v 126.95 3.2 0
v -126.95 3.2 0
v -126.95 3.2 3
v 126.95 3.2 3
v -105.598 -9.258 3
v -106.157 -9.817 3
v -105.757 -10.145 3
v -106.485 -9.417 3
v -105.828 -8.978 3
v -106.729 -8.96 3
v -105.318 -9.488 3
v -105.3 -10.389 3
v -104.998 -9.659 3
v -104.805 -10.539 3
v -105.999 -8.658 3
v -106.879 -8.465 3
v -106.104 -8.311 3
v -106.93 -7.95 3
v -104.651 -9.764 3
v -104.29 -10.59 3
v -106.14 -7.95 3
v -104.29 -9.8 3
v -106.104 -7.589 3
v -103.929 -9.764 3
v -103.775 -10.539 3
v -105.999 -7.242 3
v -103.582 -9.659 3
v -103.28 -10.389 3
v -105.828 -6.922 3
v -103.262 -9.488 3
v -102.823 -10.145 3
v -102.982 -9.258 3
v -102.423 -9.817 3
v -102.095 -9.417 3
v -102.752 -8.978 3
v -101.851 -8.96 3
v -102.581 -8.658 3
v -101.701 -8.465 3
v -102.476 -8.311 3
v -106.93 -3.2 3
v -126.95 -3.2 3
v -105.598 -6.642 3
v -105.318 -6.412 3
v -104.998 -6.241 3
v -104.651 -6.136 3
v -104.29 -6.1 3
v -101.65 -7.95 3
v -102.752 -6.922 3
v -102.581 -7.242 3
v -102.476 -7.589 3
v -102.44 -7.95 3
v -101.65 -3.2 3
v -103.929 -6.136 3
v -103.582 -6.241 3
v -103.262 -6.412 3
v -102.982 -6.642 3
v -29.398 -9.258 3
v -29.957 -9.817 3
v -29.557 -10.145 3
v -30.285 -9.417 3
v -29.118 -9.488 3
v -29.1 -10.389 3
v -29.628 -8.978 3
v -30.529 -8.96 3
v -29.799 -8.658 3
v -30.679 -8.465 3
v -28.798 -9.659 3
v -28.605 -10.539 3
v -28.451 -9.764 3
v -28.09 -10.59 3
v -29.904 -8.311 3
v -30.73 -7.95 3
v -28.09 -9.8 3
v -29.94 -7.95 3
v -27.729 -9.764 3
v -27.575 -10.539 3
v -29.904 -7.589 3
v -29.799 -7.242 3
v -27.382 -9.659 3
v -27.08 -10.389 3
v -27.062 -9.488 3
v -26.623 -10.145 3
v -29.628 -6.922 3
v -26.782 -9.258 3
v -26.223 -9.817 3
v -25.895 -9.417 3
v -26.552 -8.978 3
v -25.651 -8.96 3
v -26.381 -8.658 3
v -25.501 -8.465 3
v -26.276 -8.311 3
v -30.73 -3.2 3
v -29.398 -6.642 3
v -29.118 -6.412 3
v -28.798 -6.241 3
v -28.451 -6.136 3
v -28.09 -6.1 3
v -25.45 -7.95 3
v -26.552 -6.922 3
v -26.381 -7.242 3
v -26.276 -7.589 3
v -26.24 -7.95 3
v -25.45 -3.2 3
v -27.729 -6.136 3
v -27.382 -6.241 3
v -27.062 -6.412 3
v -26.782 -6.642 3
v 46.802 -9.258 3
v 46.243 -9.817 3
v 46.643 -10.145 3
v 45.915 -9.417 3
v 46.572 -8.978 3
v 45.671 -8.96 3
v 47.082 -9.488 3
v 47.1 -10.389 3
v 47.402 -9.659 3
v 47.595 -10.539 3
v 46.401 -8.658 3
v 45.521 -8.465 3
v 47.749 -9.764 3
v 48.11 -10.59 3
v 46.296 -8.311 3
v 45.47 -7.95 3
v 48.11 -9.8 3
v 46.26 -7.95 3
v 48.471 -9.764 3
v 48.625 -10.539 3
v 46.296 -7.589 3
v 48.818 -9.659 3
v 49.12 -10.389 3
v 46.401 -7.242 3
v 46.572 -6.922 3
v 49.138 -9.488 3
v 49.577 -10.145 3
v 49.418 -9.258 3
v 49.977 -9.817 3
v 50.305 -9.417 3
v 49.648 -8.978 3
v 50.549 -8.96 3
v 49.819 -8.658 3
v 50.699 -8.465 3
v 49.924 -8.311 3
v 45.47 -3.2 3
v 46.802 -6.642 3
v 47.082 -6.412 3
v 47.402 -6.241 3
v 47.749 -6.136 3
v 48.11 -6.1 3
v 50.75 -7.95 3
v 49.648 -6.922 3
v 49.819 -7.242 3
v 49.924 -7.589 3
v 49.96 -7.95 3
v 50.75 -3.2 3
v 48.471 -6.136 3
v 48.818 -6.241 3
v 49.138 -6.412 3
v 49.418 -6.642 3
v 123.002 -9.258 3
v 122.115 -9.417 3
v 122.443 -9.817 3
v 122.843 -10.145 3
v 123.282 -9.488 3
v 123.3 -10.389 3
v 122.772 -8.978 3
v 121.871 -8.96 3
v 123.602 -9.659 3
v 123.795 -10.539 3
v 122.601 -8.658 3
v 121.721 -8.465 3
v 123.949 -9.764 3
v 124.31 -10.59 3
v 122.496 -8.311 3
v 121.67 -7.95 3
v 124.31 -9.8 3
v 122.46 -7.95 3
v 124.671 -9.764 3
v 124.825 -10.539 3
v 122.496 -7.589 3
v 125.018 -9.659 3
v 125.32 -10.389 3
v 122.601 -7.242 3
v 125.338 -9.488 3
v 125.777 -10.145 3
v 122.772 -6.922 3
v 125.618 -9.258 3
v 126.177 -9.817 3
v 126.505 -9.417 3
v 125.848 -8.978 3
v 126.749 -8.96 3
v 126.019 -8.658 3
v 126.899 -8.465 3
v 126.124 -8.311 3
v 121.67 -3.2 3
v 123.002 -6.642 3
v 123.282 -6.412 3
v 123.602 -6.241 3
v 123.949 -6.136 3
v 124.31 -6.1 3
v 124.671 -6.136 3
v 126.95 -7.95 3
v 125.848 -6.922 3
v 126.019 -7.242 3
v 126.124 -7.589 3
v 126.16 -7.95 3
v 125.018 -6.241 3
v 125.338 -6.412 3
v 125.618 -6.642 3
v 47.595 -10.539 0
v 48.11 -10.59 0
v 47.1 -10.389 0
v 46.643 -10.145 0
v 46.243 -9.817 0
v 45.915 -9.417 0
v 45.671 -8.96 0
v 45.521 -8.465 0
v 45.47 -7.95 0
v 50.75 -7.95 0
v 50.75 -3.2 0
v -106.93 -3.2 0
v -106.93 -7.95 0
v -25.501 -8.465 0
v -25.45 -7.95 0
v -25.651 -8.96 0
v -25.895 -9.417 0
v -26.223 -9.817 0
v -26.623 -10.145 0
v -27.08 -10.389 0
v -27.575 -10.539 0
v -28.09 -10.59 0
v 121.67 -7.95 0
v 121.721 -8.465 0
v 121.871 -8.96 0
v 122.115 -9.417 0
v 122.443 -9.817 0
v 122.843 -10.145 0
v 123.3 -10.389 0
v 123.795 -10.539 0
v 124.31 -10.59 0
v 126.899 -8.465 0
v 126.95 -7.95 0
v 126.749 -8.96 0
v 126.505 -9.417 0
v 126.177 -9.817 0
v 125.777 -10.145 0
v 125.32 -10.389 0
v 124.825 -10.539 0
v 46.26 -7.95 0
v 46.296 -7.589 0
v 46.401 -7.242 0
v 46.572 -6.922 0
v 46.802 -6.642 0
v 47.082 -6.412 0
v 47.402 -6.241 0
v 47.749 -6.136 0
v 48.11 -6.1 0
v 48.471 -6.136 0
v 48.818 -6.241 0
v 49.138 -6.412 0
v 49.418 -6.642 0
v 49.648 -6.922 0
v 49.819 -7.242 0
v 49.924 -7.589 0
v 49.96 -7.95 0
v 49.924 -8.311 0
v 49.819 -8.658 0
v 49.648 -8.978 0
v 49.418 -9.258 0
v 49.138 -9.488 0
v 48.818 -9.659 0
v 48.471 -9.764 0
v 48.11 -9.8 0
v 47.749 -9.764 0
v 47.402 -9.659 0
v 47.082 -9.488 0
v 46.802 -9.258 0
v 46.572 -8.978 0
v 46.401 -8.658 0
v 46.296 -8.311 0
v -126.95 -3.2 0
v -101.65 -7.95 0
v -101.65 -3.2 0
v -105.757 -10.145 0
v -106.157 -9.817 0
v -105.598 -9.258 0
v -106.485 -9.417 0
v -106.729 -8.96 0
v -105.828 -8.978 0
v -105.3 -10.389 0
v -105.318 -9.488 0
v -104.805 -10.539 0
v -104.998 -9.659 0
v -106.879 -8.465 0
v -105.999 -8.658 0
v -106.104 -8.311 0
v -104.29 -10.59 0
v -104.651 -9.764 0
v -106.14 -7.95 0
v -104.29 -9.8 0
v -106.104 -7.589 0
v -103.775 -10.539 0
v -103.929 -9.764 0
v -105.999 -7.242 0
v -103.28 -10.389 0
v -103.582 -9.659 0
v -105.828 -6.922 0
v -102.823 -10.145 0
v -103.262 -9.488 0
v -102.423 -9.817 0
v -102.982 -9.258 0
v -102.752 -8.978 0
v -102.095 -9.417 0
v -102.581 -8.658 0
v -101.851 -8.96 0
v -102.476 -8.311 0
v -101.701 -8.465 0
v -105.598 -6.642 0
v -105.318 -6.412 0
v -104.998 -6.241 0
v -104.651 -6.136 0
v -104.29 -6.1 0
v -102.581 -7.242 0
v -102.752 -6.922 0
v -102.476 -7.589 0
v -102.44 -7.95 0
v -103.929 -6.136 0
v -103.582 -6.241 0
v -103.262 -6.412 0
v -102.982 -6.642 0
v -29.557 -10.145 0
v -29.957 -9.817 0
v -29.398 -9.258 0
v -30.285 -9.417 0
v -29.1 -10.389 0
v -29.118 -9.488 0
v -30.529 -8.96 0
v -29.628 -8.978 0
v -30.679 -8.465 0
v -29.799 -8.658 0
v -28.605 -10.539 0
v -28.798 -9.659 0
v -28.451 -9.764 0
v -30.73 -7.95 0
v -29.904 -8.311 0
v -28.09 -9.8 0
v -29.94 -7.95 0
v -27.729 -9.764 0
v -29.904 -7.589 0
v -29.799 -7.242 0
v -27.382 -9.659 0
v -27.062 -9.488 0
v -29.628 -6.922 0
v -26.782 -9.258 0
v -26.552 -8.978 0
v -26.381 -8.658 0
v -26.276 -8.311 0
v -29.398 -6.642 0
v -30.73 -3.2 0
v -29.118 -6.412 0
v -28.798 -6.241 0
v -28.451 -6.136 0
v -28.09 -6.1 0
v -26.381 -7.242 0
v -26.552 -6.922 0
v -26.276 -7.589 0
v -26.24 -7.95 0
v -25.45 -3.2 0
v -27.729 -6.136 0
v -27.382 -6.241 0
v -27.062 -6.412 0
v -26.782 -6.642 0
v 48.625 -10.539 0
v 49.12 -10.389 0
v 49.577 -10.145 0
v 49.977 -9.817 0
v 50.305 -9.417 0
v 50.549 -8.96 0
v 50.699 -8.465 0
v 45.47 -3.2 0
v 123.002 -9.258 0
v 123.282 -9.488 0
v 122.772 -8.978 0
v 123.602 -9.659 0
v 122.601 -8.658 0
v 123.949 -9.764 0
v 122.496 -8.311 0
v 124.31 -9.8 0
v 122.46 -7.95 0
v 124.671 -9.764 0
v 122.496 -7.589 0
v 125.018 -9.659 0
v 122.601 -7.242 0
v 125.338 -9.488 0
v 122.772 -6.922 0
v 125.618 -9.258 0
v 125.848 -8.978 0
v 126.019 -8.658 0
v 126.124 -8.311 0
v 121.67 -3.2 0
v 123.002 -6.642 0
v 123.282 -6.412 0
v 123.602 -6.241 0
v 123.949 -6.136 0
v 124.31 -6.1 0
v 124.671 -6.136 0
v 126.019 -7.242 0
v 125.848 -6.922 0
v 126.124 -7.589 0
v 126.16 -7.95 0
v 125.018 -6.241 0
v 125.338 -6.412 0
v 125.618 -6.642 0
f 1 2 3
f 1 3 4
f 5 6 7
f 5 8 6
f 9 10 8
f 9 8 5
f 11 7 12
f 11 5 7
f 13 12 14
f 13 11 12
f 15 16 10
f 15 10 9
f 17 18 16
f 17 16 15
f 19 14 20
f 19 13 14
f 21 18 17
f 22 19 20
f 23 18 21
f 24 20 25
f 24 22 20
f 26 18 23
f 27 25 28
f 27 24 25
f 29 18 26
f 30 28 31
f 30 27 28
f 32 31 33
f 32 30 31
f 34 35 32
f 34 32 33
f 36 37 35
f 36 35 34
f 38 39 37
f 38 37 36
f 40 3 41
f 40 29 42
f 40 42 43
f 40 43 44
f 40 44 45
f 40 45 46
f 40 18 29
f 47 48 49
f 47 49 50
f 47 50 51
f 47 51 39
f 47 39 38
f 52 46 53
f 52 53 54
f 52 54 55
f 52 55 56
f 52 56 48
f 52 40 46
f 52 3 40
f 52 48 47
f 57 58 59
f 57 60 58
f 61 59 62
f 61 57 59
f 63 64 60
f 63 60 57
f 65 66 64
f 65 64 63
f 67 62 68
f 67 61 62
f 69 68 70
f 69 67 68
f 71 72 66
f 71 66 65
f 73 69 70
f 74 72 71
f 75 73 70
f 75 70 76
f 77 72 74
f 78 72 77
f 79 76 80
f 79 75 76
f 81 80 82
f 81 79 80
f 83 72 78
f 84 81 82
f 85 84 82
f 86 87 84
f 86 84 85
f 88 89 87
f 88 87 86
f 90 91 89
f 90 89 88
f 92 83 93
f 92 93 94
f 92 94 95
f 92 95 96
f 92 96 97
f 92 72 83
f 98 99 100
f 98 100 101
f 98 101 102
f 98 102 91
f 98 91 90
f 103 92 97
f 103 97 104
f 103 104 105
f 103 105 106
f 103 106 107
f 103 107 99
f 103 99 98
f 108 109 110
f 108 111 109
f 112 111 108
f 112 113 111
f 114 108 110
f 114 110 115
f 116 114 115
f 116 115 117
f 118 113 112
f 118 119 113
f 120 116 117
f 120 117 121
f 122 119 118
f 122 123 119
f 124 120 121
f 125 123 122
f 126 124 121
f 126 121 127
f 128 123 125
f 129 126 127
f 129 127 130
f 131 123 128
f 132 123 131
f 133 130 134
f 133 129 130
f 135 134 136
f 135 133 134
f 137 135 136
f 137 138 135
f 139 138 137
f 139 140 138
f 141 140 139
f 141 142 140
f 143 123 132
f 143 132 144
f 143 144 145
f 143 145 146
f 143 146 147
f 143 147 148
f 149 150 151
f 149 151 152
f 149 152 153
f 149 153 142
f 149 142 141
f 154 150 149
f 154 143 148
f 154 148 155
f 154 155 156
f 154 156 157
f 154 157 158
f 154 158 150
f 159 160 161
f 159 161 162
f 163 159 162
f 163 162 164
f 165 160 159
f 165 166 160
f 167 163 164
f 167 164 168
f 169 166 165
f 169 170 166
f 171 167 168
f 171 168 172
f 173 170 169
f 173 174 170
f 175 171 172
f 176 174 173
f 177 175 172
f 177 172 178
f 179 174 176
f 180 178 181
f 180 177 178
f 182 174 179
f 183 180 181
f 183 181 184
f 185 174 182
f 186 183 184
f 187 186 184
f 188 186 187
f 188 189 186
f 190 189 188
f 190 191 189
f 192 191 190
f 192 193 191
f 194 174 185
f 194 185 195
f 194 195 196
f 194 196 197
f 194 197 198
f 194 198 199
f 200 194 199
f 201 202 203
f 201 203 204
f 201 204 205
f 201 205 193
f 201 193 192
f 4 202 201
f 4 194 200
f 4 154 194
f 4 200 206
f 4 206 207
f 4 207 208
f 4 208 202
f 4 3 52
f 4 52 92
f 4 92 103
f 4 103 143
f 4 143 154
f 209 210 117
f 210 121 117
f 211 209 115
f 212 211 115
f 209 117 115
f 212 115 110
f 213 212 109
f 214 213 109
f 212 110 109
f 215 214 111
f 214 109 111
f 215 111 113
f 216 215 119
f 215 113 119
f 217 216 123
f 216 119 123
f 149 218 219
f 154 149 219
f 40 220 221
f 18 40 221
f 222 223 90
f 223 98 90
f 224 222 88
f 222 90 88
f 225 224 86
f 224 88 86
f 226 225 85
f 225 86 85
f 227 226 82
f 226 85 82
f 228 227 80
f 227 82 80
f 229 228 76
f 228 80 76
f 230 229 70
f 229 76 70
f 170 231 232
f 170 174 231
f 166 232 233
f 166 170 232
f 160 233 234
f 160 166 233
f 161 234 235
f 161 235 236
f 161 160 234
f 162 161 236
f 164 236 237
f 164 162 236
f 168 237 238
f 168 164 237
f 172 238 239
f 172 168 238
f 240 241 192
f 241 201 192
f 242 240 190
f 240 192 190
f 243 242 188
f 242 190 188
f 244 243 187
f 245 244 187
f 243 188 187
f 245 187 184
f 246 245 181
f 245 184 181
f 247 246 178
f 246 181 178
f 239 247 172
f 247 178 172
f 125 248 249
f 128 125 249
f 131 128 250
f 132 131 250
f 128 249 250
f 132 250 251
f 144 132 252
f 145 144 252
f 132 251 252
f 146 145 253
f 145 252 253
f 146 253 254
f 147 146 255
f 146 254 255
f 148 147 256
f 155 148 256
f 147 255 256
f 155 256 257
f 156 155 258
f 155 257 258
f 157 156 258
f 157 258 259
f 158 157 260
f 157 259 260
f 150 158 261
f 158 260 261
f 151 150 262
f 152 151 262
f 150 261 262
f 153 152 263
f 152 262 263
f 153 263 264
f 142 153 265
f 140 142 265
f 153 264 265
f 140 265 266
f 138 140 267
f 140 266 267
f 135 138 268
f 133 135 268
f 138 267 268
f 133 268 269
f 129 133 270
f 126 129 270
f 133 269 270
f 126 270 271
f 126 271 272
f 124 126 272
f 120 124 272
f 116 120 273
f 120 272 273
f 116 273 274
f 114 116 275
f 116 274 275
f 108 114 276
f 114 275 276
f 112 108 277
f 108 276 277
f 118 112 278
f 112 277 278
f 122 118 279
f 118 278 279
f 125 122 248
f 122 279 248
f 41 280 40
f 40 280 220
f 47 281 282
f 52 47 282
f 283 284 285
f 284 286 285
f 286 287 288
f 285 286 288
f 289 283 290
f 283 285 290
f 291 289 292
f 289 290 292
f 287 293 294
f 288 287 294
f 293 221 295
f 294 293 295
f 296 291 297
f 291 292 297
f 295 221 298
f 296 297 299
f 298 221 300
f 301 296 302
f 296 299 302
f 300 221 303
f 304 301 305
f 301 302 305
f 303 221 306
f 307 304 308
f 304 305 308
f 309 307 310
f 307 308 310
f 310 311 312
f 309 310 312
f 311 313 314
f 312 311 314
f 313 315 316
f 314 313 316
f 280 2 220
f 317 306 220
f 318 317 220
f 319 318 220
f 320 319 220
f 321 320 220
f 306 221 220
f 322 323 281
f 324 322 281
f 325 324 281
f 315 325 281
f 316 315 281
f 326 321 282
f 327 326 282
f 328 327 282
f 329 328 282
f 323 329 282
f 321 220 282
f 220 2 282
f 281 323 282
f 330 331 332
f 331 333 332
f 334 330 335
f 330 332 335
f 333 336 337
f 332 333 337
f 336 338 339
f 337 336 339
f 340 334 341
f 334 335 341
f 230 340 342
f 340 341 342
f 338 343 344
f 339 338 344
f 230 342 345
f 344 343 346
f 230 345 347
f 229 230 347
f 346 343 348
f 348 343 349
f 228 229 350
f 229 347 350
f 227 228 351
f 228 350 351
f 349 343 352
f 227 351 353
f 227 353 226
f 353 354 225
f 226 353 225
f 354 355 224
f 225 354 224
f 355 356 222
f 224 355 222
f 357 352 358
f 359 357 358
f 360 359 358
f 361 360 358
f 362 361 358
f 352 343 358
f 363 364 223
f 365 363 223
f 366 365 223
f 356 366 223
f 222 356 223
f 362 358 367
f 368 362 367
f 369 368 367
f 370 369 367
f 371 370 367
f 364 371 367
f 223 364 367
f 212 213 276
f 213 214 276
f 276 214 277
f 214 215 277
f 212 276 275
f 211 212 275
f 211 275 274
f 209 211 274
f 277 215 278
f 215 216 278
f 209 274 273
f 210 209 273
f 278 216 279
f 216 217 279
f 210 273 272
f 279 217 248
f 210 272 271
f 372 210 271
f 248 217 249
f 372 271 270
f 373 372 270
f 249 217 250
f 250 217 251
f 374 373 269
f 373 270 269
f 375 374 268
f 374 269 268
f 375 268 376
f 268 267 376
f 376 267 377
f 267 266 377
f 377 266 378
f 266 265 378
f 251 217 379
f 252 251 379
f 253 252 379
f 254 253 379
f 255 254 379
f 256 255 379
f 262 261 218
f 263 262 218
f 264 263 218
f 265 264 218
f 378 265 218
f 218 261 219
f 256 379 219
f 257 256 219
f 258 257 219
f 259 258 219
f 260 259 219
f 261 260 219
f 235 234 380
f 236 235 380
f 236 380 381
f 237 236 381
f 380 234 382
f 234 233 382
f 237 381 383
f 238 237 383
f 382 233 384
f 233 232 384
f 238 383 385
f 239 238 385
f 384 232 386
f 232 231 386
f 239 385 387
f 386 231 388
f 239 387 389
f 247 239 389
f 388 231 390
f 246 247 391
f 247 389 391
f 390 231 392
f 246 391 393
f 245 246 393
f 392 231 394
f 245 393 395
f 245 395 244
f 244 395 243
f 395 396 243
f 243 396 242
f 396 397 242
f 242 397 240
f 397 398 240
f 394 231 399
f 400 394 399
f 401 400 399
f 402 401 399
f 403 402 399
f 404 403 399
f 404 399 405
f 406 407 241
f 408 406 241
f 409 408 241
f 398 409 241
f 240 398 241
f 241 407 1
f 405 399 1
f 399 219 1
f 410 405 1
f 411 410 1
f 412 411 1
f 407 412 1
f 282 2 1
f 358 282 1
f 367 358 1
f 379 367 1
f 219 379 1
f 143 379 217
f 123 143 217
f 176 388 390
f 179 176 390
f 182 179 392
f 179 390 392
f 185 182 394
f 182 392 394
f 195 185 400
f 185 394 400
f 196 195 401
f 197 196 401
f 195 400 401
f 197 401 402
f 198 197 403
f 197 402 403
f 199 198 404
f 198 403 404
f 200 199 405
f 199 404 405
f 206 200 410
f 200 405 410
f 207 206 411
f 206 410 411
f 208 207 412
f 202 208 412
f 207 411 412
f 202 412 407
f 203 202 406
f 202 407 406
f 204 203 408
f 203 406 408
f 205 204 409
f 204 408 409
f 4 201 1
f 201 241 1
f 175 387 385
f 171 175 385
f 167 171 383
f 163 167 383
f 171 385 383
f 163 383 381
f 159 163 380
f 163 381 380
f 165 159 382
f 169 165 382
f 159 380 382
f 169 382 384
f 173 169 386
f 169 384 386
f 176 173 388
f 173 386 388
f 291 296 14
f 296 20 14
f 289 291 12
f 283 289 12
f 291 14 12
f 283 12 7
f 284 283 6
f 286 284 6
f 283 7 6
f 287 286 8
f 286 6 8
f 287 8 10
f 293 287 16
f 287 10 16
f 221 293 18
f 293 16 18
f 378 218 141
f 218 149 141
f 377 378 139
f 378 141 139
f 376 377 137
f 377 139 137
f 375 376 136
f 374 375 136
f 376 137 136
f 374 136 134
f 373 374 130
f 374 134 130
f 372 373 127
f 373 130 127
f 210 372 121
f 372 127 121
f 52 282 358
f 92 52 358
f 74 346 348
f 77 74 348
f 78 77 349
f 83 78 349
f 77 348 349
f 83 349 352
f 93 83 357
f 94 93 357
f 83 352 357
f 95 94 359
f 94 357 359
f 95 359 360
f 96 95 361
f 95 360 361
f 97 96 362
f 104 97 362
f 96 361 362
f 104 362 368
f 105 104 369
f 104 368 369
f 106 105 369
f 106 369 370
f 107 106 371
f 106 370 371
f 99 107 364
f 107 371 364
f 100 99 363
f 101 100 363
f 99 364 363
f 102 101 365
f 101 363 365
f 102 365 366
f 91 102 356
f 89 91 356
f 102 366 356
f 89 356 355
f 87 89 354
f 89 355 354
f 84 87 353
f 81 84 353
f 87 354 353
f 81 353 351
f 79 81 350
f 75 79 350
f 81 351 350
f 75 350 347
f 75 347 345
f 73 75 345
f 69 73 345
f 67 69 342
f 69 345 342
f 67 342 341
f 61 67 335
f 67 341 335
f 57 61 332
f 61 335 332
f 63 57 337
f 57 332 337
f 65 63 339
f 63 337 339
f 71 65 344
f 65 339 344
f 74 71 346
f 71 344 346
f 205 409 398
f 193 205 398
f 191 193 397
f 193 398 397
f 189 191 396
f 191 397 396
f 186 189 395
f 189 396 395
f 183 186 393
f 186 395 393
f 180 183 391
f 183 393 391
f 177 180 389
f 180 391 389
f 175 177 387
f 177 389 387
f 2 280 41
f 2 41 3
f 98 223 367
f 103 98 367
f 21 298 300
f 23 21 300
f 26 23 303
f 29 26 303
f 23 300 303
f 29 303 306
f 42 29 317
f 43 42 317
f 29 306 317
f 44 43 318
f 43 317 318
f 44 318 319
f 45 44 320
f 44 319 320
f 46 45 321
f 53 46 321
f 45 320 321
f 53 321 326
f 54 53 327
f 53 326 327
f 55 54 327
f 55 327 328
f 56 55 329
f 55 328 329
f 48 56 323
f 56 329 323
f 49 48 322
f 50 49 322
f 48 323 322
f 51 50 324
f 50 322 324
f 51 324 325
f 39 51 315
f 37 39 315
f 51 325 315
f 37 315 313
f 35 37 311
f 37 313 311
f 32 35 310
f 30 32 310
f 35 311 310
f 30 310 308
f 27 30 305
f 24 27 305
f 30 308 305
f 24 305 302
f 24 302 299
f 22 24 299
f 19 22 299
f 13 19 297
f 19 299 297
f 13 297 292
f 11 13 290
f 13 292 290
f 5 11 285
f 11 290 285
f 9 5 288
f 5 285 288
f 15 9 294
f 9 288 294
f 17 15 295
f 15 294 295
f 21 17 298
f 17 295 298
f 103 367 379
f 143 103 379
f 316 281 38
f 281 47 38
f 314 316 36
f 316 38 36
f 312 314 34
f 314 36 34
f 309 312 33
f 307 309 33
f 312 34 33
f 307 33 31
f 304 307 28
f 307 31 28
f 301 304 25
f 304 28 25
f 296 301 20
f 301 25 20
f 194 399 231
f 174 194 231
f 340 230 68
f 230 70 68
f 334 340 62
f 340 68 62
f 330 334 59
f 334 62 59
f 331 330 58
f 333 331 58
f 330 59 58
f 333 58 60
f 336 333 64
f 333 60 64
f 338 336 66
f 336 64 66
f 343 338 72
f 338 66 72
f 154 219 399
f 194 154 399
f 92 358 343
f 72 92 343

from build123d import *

# Parameters (mm, degrees)
F0_W     = 253.9
F0_H     = 6.4
F1_DEPTH = 3
F3_DEPTH = 3
F4_R     = 2.63999


# Not quite as in the source:
# - a fillet or chamfer is up to 0.001 mm smaller than in the source, because OpenCascade refuses the exact size


with BuildPart() as f1:
    # F0 (on Top) → F1 (new body)
    with BuildSketch(Plane.XY):
        Rectangle(F0_W, F0_H)
    extrude(amount=F1_DEPTH)

    # F2 (on Top) → F3 (join)
    with BuildSketch(Plane.XY):
        with BuildLine():
            Line((126.95, -10.59), (126.95, -3.2))
            Line((126.95, -3.2), (121.67, -3.2))
            Line((121.67, -3.2), (121.67, -7.95))
            Line((121.67, -7.95), (122.46, -7.95))
            ThreePointArc((122.46, -7.95), (124.31, -6.1), (126.16, -7.95))
            ThreePointArc((126.16, -7.95), (125.6181475452, -9.2581475452), (124.31, -9.8))
            Line((124.31, -9.8), (124.31, -10.59))
            Line((124.31, -10.59), (126.95, -10.59))
        make_face()
        with BuildLine():
            Line((122.46, -7.95), (121.67, -7.95))
            Line((121.67, -7.95), (121.67, -10.59))
            Line((121.67, -10.59), (124.31, -10.59))
            Line((124.31, -10.59), (124.31, -9.8))
            ThreePointArc((124.31, -9.8), (123.0018524548, -9.2581475452), (122.46, -7.95))
        make_face()
        Polygon((50.75, -10.59), (50.75, -3.2), (45.47, -3.2), (45.47, -7.95), (45.47, -10.59), align=None)
        with BuildLine():
            ThreePointArc((49.96, -7.95), (48.11, -9.8), (46.26, -7.95))
            ThreePointArc((46.26, -7.95), (48.11, -6.1), (49.96, -7.95))
        make_face(mode=Mode.SUBTRACT)
        Polygon((-101.65, -3.2), (-106.93, -3.2), (-106.93, -7.95), (-106.93, -10.59), (-101.65, -10.59), align=None)
        with BuildLine():
            ThreePointArc((-102.44, -7.95), (-104.29, -9.8), (-106.14, -7.95))
            ThreePointArc((-106.14, -7.95), (-104.29, -6.1), (-102.44, -7.95))
        make_face(mode=Mode.SUBTRACT)
        Polygon((-25.45, -3.2), (-30.73, -3.2), (-30.73, -7.95), (-30.73, -10.59), (-25.45, -10.59), align=None)
        with BuildLine():
            ThreePointArc((-26.24, -7.95), (-28.09, -9.8), (-29.94, -7.95))
            ThreePointArc((-29.94, -7.95), (-28.09, -6.1), (-26.24, -7.95))
        make_face(mode=Mode.SUBTRACT)
    extrude(amount=F3_DEPTH)

    # F4 (radius 2.64 in the source; OpenCascade refuses exactly that, so slightly less here)
    f4_edges = [f1.edges().sort_by_distance(p)[0] for p in [
        (45.47, -10.59, 1.5),
        (50.75, -10.59, 1.5),
        (121.67, -10.59, 1.5),
        (126.95, -10.59, 1.5),
        (-30.73, -10.59, 1.5),
        (-25.45, -10.59, 1.5),
        (-106.93, -10.59, 1.5),
        (-101.65, -10.59, 1.5),
    ]]
    fillet(f4_edges, radius=F4_R)


solid = f1.part
